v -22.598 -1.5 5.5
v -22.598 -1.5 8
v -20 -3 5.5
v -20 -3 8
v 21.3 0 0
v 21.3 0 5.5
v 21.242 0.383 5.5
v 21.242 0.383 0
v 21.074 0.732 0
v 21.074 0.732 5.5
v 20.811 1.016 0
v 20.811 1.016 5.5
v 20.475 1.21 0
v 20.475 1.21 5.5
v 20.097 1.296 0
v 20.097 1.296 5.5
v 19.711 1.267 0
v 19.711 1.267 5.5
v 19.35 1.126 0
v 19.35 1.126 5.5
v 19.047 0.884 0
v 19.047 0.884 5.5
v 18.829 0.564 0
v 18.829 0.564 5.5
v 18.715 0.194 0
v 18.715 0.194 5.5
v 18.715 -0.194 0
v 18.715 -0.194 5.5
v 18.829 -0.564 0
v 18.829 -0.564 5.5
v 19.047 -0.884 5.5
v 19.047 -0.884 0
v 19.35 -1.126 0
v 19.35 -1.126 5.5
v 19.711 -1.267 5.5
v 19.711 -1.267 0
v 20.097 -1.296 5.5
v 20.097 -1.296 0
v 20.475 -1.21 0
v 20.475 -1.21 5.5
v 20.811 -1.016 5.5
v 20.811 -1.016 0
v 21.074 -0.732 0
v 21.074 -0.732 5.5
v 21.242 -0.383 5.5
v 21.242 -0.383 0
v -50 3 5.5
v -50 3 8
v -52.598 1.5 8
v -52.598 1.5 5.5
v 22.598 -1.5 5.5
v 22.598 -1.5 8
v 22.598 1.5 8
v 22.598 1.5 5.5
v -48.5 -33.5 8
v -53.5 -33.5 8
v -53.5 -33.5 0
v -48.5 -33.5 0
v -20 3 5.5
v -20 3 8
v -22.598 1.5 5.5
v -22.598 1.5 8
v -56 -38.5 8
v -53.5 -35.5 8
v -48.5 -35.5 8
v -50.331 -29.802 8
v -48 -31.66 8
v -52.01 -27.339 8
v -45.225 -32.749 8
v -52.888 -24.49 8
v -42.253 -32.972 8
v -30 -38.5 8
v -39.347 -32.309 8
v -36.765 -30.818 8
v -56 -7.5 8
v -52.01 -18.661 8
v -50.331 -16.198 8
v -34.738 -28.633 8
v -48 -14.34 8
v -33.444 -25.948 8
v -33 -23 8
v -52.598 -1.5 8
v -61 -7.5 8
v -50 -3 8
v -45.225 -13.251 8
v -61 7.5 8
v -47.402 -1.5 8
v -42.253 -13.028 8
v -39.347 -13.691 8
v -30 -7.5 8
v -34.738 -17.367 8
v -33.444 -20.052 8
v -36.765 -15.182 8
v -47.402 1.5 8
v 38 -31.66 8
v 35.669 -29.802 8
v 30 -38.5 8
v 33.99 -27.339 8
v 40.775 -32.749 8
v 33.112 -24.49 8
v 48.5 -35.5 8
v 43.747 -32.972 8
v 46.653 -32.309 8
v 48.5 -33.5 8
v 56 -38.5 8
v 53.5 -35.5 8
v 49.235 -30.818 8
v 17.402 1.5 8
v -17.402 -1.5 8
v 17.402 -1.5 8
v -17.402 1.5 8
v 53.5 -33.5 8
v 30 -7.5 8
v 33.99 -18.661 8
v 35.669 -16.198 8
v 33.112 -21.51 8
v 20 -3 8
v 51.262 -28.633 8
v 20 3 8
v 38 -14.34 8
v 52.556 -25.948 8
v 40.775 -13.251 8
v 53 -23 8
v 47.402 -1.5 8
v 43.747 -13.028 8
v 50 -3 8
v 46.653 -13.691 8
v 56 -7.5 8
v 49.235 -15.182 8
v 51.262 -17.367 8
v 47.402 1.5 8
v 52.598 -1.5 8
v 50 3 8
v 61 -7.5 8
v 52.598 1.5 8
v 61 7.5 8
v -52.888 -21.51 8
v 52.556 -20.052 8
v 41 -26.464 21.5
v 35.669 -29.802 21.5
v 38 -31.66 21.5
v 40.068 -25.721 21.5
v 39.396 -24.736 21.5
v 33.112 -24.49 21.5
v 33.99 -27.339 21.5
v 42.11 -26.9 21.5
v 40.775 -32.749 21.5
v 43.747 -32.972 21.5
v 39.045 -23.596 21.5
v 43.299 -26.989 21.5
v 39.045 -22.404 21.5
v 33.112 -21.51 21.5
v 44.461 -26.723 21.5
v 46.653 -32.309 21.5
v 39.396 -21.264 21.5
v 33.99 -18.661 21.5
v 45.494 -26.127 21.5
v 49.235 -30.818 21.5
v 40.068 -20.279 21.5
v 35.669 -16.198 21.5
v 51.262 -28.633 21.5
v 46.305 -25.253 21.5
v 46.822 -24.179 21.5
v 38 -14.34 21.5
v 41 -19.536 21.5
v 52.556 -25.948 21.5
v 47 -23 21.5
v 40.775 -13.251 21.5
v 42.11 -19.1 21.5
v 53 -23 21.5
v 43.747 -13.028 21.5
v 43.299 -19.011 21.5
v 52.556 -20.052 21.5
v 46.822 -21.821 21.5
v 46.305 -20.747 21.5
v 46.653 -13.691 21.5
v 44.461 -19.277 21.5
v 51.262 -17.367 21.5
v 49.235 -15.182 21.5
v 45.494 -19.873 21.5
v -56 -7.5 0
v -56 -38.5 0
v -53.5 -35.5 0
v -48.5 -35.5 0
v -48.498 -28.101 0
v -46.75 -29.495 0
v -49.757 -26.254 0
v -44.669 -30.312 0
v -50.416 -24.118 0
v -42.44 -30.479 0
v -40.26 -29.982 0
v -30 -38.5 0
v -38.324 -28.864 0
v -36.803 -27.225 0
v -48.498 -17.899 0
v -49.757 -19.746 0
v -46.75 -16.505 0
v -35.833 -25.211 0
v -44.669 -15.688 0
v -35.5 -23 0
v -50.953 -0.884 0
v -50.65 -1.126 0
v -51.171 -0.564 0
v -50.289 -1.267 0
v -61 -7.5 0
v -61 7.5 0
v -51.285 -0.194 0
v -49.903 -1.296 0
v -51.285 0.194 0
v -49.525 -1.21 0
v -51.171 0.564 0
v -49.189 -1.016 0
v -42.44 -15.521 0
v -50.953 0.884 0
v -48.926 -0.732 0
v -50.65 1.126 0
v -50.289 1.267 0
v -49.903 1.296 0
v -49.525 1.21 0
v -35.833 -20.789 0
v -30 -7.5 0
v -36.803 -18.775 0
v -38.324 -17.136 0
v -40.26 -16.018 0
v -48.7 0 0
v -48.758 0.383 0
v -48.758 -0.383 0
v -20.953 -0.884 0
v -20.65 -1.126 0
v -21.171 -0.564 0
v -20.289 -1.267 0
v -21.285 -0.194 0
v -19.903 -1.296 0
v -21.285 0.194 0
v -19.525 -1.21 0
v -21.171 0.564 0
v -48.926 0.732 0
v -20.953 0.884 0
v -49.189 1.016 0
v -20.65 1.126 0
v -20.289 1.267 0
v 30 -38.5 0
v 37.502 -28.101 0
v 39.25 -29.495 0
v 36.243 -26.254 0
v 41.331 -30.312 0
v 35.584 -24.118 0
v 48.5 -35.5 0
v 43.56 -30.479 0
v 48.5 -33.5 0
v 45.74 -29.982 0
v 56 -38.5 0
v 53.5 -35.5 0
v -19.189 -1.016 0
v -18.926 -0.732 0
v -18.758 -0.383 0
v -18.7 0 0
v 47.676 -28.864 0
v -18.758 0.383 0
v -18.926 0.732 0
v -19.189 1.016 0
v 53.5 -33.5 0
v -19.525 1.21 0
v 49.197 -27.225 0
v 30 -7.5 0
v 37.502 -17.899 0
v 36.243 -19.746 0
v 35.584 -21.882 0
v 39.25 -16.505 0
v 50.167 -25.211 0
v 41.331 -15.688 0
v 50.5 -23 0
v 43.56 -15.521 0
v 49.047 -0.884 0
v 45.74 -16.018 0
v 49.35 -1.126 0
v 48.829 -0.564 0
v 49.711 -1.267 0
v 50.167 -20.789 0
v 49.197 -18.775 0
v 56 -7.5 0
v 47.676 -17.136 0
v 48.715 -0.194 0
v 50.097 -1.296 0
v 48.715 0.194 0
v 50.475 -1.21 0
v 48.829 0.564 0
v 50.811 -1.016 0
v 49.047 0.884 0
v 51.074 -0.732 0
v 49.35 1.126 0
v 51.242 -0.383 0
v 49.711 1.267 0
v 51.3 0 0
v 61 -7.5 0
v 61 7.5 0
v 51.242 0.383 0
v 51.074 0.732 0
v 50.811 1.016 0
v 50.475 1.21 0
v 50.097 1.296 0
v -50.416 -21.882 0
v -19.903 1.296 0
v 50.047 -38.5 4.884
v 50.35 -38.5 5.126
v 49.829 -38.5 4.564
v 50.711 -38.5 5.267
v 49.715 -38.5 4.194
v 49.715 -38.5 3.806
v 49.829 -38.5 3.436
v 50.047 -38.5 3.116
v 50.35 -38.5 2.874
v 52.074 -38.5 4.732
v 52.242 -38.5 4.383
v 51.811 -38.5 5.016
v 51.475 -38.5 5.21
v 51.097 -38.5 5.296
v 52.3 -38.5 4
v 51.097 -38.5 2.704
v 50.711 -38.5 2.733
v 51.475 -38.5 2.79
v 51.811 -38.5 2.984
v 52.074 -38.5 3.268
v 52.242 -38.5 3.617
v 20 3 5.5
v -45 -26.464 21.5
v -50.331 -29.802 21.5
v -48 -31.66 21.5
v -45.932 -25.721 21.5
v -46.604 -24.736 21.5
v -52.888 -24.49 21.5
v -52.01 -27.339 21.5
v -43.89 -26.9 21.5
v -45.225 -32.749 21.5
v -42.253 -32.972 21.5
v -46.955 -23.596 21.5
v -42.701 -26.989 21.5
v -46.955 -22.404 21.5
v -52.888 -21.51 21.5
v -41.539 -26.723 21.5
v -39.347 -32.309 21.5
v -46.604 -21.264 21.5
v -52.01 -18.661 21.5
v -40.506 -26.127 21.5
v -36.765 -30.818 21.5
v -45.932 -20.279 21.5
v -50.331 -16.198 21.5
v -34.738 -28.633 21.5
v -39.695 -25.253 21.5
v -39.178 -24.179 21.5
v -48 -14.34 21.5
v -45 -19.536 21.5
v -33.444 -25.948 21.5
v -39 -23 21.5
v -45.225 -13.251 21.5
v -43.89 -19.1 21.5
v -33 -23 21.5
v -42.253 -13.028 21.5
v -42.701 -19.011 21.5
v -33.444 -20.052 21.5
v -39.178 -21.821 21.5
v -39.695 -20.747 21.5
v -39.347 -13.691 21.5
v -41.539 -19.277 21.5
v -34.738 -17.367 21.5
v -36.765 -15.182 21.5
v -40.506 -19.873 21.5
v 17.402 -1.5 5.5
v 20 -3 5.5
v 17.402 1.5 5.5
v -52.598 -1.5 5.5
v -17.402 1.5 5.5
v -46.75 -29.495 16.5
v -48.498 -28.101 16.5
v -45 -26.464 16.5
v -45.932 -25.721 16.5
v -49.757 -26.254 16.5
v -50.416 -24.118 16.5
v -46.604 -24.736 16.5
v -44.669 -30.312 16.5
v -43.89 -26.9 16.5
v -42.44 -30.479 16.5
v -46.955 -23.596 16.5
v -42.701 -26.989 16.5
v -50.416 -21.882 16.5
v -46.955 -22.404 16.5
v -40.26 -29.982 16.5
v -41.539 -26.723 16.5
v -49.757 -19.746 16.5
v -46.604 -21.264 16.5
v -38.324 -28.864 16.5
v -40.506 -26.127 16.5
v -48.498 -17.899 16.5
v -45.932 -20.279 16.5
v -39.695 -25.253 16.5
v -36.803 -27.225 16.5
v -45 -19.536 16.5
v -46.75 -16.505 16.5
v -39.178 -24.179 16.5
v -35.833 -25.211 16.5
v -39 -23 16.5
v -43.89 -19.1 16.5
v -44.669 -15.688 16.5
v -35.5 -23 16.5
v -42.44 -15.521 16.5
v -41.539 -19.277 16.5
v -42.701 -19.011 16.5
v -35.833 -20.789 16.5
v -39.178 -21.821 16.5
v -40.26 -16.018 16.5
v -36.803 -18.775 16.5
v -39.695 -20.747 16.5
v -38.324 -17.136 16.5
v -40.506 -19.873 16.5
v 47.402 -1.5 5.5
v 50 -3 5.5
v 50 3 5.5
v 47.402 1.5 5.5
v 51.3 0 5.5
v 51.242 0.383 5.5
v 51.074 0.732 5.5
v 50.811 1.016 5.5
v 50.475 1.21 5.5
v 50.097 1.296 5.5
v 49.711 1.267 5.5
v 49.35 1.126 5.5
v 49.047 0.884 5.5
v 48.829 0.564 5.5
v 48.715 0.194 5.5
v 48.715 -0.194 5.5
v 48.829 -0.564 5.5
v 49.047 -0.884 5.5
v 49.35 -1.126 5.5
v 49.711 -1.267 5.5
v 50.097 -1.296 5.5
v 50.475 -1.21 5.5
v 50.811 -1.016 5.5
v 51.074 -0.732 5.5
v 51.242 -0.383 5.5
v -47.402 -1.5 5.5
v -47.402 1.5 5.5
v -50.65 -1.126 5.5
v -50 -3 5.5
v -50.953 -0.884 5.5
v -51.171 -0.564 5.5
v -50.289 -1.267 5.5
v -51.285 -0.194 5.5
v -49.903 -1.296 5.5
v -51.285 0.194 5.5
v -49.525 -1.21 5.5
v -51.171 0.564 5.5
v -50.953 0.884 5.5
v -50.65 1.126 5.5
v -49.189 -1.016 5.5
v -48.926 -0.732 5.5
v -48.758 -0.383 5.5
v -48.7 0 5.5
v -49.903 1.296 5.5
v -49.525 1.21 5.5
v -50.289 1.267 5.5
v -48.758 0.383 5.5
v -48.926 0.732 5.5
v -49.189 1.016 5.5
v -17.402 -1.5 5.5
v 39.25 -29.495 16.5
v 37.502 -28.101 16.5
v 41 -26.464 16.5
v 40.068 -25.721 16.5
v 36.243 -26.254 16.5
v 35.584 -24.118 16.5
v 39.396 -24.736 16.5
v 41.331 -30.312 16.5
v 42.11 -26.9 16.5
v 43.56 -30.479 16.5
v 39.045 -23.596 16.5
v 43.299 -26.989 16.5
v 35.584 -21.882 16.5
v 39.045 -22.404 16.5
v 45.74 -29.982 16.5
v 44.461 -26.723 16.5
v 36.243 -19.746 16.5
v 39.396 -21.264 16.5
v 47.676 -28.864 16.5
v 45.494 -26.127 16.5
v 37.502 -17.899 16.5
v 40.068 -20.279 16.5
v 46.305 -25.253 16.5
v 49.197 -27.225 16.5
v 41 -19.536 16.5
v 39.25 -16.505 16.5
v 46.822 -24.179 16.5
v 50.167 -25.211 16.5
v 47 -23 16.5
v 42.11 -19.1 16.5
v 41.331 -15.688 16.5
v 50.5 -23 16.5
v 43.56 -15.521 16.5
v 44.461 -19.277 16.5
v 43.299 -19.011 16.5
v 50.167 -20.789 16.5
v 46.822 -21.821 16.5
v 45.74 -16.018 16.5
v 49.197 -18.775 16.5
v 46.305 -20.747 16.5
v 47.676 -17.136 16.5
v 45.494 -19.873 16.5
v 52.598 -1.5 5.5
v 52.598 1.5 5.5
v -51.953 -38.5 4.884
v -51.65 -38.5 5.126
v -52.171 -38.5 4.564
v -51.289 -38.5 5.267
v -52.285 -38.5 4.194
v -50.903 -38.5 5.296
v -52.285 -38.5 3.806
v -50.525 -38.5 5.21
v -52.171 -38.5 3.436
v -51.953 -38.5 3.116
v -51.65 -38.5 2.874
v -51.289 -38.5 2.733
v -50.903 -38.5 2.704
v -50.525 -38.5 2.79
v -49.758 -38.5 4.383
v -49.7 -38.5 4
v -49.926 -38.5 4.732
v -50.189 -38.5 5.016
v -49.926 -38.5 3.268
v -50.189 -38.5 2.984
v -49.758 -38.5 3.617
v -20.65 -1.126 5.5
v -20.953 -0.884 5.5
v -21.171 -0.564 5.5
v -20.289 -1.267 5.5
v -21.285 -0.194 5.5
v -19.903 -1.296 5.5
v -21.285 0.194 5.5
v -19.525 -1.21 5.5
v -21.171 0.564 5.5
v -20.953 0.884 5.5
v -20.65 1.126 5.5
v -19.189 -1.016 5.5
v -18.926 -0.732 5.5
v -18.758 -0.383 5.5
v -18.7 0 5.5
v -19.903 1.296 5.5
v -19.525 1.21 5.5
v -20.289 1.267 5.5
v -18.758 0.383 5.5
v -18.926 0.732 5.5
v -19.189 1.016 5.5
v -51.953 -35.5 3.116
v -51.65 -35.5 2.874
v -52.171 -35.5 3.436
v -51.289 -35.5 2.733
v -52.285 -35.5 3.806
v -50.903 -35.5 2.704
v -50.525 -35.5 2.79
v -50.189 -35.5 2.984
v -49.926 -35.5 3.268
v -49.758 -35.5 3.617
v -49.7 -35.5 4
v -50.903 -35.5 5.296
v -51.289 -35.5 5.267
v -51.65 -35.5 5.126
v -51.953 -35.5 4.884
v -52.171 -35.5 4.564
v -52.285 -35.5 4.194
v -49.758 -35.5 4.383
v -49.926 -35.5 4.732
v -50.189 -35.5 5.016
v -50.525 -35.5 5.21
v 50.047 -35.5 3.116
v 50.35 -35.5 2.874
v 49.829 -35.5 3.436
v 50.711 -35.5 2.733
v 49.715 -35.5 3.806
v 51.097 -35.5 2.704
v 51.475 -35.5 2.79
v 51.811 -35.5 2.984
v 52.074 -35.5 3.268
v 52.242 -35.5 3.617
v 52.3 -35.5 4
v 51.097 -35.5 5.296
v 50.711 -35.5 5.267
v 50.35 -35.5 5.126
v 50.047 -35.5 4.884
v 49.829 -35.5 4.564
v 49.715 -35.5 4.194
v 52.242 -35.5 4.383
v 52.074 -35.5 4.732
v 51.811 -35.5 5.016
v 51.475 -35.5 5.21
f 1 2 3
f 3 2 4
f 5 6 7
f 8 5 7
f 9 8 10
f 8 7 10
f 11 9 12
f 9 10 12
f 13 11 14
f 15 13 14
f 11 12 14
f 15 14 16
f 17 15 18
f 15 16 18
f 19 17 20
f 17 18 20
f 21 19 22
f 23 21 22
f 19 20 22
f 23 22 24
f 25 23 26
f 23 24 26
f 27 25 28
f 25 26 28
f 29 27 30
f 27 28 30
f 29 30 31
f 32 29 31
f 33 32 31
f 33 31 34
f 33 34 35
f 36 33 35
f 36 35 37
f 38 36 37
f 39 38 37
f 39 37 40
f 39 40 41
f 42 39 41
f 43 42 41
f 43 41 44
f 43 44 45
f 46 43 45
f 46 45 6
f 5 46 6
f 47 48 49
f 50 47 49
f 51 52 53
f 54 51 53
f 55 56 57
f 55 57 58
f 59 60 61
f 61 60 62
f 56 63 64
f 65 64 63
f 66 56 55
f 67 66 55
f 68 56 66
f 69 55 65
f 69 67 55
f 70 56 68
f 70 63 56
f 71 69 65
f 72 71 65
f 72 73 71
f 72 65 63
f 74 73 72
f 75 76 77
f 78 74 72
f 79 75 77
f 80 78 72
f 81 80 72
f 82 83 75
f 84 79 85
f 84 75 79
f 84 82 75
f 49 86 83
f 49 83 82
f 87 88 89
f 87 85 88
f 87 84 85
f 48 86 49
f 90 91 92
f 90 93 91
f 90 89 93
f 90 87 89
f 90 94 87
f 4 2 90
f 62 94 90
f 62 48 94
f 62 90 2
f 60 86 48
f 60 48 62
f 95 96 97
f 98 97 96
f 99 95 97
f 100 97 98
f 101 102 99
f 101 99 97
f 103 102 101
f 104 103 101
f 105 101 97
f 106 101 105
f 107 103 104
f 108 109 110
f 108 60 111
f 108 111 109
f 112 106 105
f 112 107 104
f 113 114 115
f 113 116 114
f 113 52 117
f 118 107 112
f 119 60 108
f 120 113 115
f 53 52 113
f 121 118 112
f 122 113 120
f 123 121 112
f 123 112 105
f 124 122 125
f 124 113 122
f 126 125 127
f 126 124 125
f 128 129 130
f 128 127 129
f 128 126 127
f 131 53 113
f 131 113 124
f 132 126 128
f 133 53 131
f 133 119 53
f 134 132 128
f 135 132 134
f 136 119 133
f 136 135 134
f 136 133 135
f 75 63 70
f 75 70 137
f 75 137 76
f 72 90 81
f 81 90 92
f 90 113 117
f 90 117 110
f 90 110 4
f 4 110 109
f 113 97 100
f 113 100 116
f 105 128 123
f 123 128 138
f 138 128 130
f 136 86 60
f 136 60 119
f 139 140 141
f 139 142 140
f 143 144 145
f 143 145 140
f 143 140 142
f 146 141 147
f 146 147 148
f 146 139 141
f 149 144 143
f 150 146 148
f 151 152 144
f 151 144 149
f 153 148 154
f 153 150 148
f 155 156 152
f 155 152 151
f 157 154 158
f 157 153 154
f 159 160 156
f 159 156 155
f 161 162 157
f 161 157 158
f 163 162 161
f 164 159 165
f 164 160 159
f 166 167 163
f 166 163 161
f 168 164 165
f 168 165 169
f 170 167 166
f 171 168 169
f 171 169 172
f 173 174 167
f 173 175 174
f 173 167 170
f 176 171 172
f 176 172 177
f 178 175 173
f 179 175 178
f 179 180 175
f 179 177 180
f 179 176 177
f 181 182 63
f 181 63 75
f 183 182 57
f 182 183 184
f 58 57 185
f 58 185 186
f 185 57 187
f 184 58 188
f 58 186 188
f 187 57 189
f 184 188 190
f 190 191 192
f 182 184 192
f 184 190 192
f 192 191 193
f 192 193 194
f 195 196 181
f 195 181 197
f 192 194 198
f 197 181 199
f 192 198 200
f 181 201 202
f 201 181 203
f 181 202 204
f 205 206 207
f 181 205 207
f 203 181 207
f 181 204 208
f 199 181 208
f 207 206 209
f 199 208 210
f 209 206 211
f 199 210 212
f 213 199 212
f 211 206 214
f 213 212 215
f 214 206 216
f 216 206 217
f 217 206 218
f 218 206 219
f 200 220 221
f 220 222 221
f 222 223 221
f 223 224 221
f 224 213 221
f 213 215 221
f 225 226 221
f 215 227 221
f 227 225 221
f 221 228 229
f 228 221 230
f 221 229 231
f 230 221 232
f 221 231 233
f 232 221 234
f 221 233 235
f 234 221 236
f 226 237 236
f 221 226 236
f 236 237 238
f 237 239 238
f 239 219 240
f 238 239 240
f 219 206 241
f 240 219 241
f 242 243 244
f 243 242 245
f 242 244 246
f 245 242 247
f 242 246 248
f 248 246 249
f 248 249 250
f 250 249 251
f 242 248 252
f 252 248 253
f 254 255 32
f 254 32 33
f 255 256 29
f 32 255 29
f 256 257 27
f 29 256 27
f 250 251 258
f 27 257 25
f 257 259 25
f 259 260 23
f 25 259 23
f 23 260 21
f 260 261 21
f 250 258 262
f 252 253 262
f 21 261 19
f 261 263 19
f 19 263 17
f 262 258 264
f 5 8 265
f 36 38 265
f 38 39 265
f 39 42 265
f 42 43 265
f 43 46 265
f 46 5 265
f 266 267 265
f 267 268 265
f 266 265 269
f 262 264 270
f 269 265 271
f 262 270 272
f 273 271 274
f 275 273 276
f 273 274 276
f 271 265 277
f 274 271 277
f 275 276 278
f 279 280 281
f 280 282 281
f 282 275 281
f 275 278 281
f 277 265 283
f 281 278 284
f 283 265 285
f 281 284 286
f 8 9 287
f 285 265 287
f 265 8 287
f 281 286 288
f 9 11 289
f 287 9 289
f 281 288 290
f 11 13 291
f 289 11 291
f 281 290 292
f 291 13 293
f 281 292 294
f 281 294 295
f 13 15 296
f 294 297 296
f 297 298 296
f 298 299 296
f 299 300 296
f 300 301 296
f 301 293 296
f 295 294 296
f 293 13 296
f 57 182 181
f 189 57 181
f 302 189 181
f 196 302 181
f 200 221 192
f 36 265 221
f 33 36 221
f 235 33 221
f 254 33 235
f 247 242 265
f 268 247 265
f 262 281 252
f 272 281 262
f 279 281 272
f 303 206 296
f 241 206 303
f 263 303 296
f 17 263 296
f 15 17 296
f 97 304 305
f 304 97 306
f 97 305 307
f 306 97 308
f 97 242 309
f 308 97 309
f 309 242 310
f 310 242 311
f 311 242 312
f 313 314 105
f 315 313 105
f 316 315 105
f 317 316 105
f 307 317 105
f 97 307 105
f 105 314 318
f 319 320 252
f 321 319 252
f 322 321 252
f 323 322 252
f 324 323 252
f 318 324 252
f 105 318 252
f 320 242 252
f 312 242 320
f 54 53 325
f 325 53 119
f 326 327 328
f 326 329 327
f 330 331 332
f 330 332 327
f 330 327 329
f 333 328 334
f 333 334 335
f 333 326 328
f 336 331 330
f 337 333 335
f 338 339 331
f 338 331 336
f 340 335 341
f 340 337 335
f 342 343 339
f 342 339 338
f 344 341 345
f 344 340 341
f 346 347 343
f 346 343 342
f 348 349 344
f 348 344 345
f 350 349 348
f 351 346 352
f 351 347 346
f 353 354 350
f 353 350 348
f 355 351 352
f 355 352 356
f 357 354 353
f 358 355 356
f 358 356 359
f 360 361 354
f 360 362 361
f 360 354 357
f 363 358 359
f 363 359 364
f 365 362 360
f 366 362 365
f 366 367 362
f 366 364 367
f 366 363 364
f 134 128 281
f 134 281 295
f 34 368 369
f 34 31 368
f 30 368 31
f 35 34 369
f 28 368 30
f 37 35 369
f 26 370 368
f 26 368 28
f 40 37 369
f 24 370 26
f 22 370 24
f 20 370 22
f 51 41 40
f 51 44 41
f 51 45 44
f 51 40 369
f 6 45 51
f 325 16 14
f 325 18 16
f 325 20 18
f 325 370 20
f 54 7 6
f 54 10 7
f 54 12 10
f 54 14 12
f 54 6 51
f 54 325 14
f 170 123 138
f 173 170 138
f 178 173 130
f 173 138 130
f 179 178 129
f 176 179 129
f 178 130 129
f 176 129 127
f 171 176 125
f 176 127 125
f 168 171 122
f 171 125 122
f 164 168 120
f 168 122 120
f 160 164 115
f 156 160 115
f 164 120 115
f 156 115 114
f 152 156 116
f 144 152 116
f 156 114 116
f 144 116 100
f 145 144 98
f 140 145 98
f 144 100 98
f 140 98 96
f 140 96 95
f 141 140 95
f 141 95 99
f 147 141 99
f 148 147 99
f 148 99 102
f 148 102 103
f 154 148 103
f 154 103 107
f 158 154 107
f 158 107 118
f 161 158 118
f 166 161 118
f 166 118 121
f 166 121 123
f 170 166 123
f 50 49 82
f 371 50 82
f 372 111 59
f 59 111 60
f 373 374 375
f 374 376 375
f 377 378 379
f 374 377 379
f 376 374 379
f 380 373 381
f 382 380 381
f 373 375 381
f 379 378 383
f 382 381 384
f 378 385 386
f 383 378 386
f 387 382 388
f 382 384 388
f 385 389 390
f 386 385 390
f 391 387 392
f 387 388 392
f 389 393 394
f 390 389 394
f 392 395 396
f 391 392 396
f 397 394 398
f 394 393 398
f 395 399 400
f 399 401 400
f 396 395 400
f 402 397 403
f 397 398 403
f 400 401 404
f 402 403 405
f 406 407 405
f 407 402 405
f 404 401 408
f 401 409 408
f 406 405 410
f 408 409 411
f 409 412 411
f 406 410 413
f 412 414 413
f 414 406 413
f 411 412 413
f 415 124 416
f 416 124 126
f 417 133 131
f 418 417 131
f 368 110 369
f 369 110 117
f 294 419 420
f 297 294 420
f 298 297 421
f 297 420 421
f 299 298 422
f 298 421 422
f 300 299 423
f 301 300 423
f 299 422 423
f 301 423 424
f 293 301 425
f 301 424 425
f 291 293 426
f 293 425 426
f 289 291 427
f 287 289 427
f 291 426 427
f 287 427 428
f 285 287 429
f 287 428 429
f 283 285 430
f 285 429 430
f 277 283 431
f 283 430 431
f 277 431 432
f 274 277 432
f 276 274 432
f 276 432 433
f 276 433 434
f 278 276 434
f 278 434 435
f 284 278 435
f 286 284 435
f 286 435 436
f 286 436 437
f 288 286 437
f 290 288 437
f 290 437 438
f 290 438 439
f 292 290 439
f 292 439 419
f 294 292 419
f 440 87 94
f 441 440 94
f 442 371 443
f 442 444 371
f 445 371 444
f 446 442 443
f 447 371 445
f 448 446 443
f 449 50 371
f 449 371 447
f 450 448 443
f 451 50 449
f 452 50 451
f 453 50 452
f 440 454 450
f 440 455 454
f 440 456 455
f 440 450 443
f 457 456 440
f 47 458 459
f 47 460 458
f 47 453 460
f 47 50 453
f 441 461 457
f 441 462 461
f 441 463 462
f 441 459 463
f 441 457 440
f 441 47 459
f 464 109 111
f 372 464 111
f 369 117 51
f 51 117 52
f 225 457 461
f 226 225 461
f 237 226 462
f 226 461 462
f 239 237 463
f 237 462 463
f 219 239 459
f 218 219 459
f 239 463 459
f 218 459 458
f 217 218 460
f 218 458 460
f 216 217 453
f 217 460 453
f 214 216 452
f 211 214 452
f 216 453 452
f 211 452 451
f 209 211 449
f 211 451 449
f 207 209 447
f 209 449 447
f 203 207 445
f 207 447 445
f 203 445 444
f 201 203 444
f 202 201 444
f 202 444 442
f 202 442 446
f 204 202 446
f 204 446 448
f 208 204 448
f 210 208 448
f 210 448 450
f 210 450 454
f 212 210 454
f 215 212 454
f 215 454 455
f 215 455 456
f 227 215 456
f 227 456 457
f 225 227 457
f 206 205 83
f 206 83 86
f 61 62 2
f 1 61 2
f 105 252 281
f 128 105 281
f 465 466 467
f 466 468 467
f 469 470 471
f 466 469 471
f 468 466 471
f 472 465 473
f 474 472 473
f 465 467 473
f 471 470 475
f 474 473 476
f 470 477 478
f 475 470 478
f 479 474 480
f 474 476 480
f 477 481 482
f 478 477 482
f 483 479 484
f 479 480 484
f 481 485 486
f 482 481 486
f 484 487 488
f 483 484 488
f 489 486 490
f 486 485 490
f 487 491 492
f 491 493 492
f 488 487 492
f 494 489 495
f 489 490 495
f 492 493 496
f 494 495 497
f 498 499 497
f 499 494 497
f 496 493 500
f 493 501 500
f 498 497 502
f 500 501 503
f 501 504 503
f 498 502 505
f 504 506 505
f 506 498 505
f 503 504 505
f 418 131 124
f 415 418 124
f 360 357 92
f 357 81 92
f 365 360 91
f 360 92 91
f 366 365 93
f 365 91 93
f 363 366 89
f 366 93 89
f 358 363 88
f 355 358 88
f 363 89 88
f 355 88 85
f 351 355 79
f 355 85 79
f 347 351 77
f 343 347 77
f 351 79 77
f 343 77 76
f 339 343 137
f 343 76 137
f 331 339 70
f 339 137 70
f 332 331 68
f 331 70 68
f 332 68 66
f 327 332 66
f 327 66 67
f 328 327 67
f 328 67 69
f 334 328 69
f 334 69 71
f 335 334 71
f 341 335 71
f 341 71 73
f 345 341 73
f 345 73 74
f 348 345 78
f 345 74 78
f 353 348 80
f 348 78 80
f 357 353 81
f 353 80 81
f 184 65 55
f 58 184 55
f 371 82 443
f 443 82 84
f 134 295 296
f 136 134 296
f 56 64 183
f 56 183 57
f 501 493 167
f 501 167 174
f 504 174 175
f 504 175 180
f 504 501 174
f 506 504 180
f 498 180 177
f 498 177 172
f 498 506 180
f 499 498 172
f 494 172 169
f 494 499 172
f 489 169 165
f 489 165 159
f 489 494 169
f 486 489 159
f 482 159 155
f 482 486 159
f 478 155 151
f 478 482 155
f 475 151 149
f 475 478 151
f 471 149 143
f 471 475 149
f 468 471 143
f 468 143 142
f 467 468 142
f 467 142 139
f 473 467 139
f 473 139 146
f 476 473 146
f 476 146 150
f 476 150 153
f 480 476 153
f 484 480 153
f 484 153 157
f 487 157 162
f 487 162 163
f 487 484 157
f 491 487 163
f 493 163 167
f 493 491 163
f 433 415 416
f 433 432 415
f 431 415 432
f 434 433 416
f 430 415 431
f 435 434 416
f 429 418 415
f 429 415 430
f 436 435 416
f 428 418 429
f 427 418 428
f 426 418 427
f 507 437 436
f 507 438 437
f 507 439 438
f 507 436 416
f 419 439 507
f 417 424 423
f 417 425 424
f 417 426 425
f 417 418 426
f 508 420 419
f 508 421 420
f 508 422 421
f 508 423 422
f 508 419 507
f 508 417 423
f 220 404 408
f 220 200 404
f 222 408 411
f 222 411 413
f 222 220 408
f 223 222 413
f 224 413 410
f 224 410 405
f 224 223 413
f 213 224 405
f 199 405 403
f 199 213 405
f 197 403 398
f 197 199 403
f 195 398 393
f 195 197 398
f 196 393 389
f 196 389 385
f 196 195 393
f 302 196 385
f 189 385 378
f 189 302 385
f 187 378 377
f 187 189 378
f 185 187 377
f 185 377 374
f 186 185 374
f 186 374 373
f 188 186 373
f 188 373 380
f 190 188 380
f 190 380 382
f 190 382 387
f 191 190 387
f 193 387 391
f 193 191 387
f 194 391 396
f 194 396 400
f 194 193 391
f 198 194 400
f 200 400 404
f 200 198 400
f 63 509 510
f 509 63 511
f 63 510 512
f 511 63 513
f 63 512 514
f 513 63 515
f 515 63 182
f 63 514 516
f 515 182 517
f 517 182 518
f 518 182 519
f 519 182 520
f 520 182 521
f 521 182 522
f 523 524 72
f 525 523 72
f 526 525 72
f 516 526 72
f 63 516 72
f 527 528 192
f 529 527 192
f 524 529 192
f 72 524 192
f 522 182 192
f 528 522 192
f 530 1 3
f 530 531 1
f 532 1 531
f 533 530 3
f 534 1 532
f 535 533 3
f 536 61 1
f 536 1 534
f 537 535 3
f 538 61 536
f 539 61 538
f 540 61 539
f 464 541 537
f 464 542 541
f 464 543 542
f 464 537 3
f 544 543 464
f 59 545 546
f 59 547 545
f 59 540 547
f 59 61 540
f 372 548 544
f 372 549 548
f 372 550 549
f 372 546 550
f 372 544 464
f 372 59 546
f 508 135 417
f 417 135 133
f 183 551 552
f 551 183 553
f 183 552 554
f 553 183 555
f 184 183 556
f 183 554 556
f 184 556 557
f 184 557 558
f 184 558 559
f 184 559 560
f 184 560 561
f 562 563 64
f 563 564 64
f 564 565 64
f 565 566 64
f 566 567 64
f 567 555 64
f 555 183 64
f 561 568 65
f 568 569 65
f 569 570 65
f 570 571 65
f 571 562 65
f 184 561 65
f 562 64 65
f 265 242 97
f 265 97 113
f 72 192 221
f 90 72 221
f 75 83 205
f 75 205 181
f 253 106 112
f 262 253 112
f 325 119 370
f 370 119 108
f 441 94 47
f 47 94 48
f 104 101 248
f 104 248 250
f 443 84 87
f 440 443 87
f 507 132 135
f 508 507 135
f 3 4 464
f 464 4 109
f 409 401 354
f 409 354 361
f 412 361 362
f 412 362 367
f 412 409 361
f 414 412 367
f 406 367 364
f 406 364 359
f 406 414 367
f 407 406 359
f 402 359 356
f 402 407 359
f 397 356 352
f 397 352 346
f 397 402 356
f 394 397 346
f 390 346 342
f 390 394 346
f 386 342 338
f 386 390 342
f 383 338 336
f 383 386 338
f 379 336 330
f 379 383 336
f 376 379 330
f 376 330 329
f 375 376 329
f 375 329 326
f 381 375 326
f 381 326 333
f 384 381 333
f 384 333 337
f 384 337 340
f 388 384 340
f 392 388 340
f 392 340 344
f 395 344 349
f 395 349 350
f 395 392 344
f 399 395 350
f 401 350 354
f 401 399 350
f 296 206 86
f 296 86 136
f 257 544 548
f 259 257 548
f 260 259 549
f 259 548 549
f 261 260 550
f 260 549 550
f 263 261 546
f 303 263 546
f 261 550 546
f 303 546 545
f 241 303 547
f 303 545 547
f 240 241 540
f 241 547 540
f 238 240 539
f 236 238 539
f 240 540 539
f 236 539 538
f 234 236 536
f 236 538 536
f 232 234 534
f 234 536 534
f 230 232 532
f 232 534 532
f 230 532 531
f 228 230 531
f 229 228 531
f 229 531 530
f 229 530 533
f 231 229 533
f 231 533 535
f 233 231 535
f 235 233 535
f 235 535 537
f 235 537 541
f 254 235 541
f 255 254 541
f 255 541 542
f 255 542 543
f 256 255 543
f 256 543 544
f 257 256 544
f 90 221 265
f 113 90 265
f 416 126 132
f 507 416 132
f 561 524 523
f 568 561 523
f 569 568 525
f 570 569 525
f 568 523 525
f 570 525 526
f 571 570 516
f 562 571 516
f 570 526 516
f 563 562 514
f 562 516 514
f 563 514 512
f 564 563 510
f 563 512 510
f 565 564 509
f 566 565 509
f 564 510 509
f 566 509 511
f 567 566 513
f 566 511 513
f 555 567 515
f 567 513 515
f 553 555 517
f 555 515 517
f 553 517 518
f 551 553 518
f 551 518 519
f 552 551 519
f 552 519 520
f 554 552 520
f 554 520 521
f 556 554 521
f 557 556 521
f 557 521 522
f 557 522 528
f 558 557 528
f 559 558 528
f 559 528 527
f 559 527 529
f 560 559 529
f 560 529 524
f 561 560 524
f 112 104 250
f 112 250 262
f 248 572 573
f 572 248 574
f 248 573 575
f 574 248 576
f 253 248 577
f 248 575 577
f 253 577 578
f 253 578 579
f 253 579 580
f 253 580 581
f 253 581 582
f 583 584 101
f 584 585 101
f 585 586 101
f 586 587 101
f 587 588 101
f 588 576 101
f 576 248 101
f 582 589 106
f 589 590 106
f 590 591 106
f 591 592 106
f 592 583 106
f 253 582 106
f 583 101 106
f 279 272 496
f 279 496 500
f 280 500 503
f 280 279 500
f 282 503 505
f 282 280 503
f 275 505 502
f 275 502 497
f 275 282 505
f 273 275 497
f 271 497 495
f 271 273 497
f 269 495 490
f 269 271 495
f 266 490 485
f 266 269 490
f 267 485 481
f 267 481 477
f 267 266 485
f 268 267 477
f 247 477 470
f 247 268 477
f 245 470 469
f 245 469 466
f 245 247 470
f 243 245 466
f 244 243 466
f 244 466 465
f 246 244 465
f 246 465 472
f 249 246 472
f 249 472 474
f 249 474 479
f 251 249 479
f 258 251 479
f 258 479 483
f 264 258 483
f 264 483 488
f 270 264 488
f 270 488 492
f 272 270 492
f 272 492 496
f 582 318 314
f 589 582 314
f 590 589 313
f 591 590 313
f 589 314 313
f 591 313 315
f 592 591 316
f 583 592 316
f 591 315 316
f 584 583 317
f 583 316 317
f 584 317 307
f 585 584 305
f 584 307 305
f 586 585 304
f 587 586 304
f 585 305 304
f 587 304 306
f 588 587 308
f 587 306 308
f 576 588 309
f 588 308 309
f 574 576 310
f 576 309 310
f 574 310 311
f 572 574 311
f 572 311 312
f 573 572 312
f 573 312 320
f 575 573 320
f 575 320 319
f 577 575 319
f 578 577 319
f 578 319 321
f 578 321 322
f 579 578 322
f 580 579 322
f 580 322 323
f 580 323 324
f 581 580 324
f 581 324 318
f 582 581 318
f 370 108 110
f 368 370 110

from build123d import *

# Parameters (mm, degrees)
SKETCH1_W               = 122
SKETCH1_H               = 15
BOSS_EXTRUDE1_DEPTH     = 8
SKETCH2_R               = 1.3
CUT_EXTRUDE1_DEPTH      = 1
CUT_EXTRUDE1_DEPTH_BACK = 9
CUT_EXTRUDE3_DEPTH      = 2.5
SKETCH5_W               = 26
SKETCH5_H               = 31
SKETCH5_R               = 7.5
BOSS_EXTRUDE2_DEPTH     = 8
SKETCH6_R               = 10
SKETCH6_R_2             = 7.5
BOSS_EXTRUDE3_DEPTH     = 8.5
SKETCH7_R               = 10
SKETCH7_R_2             = 4
BOSS_EXTRUDE4_DEPTH     = 5
SKETCH8_R               = 1.3
CUT_EXTRUDE4_DEPTH      = 5
SKETCH9_W               = 5
SKETCH9_H               = 2
CUT_EXTRUDE5_DEPTH      = 14.5
CUT_EXTRUDE5_DEPTH_BACK = 9


with BuildPart() as part:
    # Sketch1 → Boss-Extrude1 (new body)
    with BuildSketch(Plane.XY):
        Rectangle(SKETCH1_W, SKETCH1_H)
    extrude(amount=BOSS_EXTRUDE1_DEPTH)

    # Sketch2 → Cut-Extrude1 (cut, two sides)
    with BuildSketch(Plane.XY.offset(8)) as cut_extrude1_sk:
        with Locations((-20, 0)):
            Circle(SKETCH2_R)
        with Locations((20, 0)):
            Circle(SKETCH2_R)
        with Locations((-50, 0)):
            Circle(SKETCH2_R)
        with Locations((50, 0)):
            Circle(SKETCH2_R)
    extrude(amount=CUT_EXTRUDE1_DEPTH, mode=Mode.SUBTRACT)
    extrude(cut_extrude1_sk.sketch, amount=-CUT_EXTRUDE1_DEPTH_BACK, mode=Mode.SUBTRACT)

    # Sketch4 → Cut-Extrude3 (cut)
    with BuildSketch(Plane.XY.offset(8)):
        Polygon((-50, 3), (-52.598076211, 1.5), (-52.598076211, -1.5), (-50, -3), (-47.401923789, -1.5), (-47.401923789, 1.5), align=None)
        Polygon((-20, 3), (-22.598076211, 1.5), (-22.598076211, -1.5), (-20, -3), (-17.401923789, -1.5), (-17.401923789, 1.5), align=None)
        Polygon((20, 3), (17.401923789, 1.5), (17.401923789, -1.5), (20, -3), (22.598076211, -1.5), (22.598076211, 1.5), align=None)
        Polygon((50, 3), (47.401923789, 1.5), (47.401923789, -1.5), (50, -3), (52.598076211, -1.5), (52.598076211, 1.5), align=None)
    extrude(amount=-CUT_EXTRUDE3_DEPTH, mode=Mode.SUBTRACT)

    # Sketch5 → Boss-Extrude2 (add)
    with BuildSketch(Plane.XY):
        with Locations((-43, -23)):
            Rectangle(SKETCH5_W, SKETCH5_H)
        with Locations((-43, -23)):
            Circle(SKETCH5_R, mode=Mode.SUBTRACT)
        with Locations((43, -23)):
            Rectangle(SKETCH5_W, SKETCH5_H)
        with Locations((43, -23)):
            Circle(SKETCH5_R, mode=Mode.SUBTRACT)
    extrude(amount=BOSS_EXTRUDE2_DEPTH)

    # Sketch6 → Boss-Extrude3 (add)
    with BuildSketch(Plane.XY.offset(8)):
        with Locations((-43, -23)):
            Circle(SKETCH6_R)
        with Locations((-43, -23)):
            Circle(SKETCH6_R_2, mode=Mode.SUBTRACT)
        with Locations((43, -23)):
            Circle(SKETCH6_R)
        with Locations((43, -23)):
            Circle(SKETCH6_R_2, mode=Mode.SUBTRACT)
    extrude(amount=BOSS_EXTRUDE3_DEPTH)

    # Sketch7 → Boss-Extrude4 (add)
    with BuildSketch(Plane.XY.offset(16.5)):
        with Locations((-43, -23)):
            Circle(SKETCH7_R)
        with Locations((-43, -23)):
            Circle(SKETCH7_R_2, mode=Mode.SUBTRACT)
        with Locations((43, -23)):
            Circle(SKETCH7_R)
        with Locations((43, -23)):
            Circle(SKETCH7_R_2, mode=Mode.SUBTRACT)
    extrude(amount=BOSS_EXTRUDE4_DEPTH)

    # Sketch8 → Cut-Extrude4 (cut)
    with BuildSketch(Plane.XZ.offset(38.5)):
        with Locations((51, 4)):
            Circle(SKETCH8_R)
        with Locations((-51, 4)):
            Circle(SKETCH8_R)
    extrude(amount=-CUT_EXTRUDE4_DEPTH, mode=Mode.SUBTRACT)

    # Sketch9 → Cut-Extrude5 (cut, two sides)
    with BuildSketch(Plane.XY.offset(8)) as cut_extrude5_sk:
        with Locations((-51, -34.5)):
            Rectangle(SKETCH9_W, SKETCH9_H)
        with Locations((51, -34.5)):
            Rectangle(SKETCH9_W, SKETCH9_H)
    extrude(amount=CUT_EXTRUDE5_DEPTH, mode=Mode.SUBTRACT)
    extrude(cut_extrude5_sk.sketch, amount=-CUT_EXTRUDE5_DEPTH_BACK, mode=Mode.SUBTRACT)


solid = part.part
